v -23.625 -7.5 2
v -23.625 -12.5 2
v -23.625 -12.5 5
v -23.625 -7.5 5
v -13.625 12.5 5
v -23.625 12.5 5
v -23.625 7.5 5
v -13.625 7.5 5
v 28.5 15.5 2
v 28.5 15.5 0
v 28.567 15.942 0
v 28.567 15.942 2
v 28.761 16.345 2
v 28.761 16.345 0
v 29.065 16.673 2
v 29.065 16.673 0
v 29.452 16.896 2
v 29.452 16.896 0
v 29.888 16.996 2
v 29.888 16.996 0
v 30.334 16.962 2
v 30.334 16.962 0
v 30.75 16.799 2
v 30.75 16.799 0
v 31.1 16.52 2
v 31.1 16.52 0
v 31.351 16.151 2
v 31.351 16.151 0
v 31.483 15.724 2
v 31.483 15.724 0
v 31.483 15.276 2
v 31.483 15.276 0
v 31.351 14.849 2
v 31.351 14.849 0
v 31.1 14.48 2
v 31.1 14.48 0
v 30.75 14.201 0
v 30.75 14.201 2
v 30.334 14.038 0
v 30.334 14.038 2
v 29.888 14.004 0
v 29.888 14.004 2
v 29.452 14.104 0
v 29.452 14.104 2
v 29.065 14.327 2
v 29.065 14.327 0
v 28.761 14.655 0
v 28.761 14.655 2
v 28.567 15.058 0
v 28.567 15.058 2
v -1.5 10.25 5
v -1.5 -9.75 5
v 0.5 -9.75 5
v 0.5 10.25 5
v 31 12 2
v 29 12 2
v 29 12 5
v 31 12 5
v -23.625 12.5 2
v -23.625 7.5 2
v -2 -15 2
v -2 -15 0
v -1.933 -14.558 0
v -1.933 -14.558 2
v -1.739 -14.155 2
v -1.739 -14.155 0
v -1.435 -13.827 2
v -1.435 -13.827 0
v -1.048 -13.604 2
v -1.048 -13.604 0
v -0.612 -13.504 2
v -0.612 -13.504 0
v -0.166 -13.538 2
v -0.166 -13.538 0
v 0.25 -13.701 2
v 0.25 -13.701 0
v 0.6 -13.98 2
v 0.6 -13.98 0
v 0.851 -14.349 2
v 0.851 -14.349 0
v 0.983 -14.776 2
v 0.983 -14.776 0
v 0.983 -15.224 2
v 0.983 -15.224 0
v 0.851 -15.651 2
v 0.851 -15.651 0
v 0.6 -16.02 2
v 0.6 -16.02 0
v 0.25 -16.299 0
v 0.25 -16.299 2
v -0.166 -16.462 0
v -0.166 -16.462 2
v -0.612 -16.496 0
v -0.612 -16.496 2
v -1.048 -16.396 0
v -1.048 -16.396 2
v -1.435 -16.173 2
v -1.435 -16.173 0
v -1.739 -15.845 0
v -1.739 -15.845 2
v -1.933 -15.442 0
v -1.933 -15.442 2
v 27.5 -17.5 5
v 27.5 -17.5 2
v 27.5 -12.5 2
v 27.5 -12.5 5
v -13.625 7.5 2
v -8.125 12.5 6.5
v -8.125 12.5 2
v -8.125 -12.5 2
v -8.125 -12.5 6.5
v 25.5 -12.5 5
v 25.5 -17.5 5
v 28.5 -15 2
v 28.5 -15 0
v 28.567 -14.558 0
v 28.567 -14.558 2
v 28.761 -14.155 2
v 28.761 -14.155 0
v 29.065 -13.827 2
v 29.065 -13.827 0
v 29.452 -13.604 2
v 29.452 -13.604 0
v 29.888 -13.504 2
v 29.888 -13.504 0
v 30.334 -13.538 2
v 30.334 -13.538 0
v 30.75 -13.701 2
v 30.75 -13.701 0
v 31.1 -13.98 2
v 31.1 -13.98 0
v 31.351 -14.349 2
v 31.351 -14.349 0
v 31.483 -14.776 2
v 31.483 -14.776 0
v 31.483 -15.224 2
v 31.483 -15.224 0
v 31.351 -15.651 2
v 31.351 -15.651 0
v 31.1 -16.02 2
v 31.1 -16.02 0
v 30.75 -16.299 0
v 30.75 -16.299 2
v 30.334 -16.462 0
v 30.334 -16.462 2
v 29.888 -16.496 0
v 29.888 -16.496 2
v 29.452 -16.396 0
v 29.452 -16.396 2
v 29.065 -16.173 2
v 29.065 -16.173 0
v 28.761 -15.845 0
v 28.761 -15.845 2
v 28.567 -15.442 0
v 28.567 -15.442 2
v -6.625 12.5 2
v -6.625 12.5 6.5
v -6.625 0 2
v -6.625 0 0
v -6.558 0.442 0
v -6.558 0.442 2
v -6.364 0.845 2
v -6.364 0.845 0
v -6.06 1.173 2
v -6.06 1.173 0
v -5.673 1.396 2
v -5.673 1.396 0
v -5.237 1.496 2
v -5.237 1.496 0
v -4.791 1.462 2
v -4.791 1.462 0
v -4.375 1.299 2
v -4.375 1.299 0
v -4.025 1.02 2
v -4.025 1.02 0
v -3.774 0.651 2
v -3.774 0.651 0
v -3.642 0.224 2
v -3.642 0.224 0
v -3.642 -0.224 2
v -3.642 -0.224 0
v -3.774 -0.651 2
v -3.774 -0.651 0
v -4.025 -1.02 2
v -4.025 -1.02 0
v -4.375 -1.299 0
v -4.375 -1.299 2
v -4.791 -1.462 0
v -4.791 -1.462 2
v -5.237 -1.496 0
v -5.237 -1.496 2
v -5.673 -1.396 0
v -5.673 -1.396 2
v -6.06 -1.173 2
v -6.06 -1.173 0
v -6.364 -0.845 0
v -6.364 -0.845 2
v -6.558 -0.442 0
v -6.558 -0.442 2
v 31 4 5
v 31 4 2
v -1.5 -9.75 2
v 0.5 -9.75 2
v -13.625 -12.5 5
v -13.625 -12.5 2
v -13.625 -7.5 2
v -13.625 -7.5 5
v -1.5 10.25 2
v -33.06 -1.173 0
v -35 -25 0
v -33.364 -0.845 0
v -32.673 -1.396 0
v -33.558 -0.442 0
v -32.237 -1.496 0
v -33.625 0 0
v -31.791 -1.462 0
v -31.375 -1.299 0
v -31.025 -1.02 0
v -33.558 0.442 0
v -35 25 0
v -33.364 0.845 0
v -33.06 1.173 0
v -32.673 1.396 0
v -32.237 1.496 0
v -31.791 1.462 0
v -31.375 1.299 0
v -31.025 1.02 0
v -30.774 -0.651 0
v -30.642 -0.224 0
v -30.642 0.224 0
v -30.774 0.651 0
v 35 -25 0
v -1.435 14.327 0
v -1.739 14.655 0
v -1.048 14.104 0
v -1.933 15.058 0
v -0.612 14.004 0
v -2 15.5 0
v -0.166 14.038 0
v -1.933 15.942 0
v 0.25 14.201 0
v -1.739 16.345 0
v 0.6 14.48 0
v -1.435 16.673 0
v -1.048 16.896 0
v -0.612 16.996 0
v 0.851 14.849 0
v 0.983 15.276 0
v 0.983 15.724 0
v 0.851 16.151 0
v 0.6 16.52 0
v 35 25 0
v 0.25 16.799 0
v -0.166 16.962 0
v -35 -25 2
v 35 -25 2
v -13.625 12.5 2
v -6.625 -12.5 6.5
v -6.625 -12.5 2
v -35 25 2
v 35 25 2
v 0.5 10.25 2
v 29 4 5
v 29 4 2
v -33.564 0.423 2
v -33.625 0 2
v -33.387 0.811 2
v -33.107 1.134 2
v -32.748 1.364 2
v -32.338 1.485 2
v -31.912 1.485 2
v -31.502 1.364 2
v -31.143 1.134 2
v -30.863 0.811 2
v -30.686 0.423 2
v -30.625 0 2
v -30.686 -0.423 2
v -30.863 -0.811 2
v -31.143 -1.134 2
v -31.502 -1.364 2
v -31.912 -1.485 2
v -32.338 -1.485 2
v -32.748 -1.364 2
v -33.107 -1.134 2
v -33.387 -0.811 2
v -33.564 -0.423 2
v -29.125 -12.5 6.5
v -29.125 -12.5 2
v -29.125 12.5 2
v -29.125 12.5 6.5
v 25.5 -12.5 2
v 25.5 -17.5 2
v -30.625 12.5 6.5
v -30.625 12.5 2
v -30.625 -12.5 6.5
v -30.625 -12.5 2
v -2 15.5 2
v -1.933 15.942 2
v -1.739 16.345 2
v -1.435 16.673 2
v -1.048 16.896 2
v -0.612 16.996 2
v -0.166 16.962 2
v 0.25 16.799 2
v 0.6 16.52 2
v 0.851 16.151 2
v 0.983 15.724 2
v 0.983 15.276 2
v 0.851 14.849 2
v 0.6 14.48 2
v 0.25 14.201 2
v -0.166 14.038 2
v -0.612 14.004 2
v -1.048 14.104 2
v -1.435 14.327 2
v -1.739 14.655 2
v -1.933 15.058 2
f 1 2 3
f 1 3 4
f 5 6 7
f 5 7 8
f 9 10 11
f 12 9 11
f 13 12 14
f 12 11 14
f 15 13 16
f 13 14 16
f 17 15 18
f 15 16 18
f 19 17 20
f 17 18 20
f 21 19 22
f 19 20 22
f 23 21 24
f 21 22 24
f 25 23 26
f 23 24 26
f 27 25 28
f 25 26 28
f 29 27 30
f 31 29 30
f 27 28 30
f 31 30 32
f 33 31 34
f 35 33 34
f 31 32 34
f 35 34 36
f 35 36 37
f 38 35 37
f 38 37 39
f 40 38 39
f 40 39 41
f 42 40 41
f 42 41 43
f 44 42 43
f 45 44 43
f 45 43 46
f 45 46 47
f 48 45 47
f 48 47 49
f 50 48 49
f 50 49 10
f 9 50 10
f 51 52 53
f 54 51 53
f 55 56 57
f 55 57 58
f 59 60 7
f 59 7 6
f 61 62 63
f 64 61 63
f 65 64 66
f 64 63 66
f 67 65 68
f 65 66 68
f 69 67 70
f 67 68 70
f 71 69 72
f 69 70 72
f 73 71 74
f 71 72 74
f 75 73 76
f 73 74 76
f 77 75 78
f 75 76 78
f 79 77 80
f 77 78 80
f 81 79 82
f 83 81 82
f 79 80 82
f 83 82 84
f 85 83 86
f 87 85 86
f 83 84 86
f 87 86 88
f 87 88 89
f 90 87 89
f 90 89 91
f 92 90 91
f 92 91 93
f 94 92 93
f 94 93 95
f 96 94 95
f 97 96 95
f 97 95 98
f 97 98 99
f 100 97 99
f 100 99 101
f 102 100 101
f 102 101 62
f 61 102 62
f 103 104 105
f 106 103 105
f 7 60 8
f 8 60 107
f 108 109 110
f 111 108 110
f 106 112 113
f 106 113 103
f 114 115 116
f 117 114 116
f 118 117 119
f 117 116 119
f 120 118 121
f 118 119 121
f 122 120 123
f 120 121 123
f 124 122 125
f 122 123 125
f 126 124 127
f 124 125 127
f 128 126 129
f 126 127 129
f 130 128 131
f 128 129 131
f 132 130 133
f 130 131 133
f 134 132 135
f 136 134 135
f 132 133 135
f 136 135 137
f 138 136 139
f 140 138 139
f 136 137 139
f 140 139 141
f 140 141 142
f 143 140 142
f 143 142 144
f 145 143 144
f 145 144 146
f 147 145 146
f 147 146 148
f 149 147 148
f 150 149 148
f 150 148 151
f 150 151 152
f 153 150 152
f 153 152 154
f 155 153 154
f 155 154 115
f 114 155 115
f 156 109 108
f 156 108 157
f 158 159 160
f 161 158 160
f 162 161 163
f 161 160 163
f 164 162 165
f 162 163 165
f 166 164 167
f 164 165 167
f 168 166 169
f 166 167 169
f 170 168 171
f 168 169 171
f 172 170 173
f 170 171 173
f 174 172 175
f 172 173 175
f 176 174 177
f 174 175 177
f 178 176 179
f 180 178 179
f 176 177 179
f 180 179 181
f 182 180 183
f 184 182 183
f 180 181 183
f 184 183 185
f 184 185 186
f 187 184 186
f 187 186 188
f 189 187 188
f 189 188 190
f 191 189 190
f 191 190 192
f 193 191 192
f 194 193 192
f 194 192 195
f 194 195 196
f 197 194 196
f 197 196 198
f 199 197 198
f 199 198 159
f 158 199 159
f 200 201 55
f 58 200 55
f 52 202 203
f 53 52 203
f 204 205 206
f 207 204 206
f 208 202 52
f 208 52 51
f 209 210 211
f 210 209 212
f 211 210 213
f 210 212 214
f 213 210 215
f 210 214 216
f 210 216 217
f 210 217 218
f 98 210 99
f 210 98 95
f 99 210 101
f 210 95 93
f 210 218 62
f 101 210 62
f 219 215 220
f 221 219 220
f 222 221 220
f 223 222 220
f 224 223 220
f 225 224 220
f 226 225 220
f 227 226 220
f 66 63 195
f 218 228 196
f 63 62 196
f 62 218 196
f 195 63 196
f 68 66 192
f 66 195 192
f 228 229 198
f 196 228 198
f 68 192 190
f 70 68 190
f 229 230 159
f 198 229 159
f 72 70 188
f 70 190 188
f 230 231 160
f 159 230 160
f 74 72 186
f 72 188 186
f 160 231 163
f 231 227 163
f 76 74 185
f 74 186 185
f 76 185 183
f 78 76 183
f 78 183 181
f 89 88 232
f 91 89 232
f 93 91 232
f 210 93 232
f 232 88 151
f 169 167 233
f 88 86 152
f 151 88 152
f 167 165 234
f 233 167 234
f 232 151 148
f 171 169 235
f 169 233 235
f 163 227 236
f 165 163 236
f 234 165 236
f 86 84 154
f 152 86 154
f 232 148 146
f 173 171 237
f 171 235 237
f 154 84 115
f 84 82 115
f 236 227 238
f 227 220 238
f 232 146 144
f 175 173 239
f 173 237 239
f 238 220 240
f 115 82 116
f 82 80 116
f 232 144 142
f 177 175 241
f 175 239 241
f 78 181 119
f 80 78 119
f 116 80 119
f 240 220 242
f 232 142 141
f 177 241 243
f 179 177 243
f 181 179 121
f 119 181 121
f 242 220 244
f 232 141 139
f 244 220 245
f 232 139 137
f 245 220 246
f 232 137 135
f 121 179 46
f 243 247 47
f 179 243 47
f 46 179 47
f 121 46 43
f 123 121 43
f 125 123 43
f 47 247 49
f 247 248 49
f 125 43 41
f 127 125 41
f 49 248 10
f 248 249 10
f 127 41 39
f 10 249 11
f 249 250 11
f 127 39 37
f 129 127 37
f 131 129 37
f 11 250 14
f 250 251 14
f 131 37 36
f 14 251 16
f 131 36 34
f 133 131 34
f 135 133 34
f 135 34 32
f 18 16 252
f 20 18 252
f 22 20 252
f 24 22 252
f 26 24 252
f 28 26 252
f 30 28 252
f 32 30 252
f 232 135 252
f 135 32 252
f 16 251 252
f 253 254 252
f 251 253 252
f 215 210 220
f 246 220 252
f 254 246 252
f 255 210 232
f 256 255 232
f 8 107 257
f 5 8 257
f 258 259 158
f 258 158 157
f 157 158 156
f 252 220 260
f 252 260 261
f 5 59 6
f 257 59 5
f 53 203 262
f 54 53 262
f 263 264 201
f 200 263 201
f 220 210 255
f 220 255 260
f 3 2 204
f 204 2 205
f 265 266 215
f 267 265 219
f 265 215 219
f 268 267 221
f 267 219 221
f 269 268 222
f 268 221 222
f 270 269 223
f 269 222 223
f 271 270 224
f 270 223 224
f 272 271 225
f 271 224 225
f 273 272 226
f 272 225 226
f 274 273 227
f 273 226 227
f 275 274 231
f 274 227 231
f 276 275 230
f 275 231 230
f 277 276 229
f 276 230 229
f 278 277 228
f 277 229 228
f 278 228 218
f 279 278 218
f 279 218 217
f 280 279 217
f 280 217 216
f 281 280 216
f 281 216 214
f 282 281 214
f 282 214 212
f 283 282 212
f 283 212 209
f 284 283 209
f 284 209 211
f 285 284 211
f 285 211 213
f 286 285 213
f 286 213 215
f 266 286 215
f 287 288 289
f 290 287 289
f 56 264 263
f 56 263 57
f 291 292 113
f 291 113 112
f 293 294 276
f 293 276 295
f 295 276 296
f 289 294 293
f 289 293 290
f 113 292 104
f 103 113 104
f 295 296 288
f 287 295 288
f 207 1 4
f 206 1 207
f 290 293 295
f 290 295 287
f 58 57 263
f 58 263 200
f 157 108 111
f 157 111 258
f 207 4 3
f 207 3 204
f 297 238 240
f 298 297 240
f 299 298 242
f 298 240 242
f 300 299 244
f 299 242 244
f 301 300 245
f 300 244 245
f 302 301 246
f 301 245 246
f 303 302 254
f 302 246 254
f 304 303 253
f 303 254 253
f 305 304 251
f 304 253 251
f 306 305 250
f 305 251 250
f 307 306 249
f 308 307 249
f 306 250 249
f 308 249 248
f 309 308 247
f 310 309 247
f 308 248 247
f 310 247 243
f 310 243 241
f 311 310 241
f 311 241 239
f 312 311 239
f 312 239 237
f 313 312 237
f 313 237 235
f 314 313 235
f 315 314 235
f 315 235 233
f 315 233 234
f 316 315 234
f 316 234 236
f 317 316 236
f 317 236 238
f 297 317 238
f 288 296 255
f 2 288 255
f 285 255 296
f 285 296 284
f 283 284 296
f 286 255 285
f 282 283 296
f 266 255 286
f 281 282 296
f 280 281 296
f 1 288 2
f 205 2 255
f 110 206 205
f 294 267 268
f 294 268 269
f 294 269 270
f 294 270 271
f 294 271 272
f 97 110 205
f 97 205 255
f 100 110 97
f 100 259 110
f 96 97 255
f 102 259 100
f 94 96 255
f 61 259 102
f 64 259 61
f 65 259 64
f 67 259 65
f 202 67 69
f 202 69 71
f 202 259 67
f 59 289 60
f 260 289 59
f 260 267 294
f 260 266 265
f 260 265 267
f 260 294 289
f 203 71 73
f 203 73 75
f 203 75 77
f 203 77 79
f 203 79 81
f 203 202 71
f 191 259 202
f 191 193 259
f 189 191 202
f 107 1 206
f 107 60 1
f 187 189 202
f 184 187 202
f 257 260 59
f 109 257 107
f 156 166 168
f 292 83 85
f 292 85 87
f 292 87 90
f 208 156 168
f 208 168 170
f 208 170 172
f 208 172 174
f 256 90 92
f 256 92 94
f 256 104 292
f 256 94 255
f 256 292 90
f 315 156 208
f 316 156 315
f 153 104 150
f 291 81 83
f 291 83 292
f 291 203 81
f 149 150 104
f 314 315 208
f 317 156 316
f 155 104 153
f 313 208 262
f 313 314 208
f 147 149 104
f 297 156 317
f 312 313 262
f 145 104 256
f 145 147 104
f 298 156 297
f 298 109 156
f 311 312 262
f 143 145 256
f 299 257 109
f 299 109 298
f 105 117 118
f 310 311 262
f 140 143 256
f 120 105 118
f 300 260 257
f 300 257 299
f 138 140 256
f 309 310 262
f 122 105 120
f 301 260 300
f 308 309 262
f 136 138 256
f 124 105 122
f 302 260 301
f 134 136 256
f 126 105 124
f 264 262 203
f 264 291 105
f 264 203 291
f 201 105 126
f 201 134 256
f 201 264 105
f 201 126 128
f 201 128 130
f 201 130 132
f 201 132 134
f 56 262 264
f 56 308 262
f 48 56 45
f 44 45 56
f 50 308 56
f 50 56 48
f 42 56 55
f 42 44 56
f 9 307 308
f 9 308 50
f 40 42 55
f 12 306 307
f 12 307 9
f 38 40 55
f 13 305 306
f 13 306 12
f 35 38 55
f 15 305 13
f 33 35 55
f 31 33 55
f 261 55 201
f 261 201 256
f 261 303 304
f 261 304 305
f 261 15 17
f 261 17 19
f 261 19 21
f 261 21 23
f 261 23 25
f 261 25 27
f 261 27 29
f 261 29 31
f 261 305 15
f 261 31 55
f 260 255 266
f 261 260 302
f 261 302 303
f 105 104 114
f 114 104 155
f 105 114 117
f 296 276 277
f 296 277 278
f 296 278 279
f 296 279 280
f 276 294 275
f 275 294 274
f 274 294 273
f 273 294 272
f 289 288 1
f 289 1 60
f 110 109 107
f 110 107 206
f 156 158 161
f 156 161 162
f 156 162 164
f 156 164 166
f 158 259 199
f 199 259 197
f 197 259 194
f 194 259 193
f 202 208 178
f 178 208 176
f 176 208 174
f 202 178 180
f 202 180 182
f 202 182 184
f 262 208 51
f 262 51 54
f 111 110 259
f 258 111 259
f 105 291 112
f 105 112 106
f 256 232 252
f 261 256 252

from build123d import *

# Parameters (mm, degrees)
F0_W           = 70
F0_H           = 50
F1_DEPTH       = 2
F3_W           = 1.5
F3_H           = 12.5
F4_DEPTH       = 4.5
F5_D           = 3
F5_DEPTH       = 10
F5_TIP         = 0.9012909285
F5_ON_F3_D     = 3
F5_ON_F3_DEPTH = 10
F5_ON_F3_TIP   = 0.9012909285
F3_W_2         = 10
F3_H_2         = 5
F3_W_3         = 2
F3_H_3         = 8
F3_H_4         = 20
F6_DEPTH       = 3


with BuildPart() as f1:
    # F0 (on Top) → F1 (new body)
    with BuildSketch(Plane.XY):
        Rectangle(F0_W, F0_H)
    extrude(amount=F1_DEPTH)

    # F3 (on face) → F4 (join)
    with BuildSketch(Plane.XY.offset(2)):
        with Locations((-29.875, 6.25)):
            Rectangle(F3_W, F3_H)
        with Locations((-29.875, -6.25)):
            Rectangle(F3_W, F3_H)
        with Locations((-7.375, 6.25)):
            Rectangle(F3_W, F3_H)
        with Locations((-7.375, -6.25)):
            Rectangle(F3_W, F3_H)
    extrude(amount=F4_DEPTH)

    # F5
    with Locations(Plane.XY.offset(2)):
        with Locations((-0.5, 15.5), (30, 15.5), (30, -15), (-0.5, -15)):
            Hole(F5_D / 2, depth=F5_DEPTH)
            with Locations((0, 0, -(F5_DEPTH + F5_TIP / 2))):  # 118° drill point
                Cone(0, F5_D / 2, F5_TIP, mode=Mode.SUBTRACT)

    # F5 on F3
    with Locations(Plane.XY.offset(2)):
        with Locations((-5.125, 0), (-32.125, 0)):
            Hole(F5_ON_F3_D / 2, depth=F5_ON_F3_DEPTH)
            with Locations((0, 0, -(F5_ON_F3_DEPTH + F5_ON_F3_TIP / 2))):  # 118° drill point
                Cone(0, F5_ON_F3_D / 2, F5_ON_F3_TIP, mode=Mode.SUBTRACT)

    # F3 (on face) → F6 (join)
    with BuildSketch(Plane.XY.offset(2)):
        with Locations((-18.625, 10)):
            Rectangle(F3_W_2, F3_H_2)
        with Locations((-18.625, -10)):
            Rectangle(F3_W_2, F3_H_2)
        with Locations((26.5, -15)):
            Rectangle(F3_W_3, F3_H_2)
        with Locations((30, 8)):
            Rectangle(F3_W_3, F3_H_3)
        with Locations((-0.5, 0.25)):
            Rectangle(F3_W_3, F3_H_4)
    extrude(amount=F6_DEPTH)


solid = f1.part
